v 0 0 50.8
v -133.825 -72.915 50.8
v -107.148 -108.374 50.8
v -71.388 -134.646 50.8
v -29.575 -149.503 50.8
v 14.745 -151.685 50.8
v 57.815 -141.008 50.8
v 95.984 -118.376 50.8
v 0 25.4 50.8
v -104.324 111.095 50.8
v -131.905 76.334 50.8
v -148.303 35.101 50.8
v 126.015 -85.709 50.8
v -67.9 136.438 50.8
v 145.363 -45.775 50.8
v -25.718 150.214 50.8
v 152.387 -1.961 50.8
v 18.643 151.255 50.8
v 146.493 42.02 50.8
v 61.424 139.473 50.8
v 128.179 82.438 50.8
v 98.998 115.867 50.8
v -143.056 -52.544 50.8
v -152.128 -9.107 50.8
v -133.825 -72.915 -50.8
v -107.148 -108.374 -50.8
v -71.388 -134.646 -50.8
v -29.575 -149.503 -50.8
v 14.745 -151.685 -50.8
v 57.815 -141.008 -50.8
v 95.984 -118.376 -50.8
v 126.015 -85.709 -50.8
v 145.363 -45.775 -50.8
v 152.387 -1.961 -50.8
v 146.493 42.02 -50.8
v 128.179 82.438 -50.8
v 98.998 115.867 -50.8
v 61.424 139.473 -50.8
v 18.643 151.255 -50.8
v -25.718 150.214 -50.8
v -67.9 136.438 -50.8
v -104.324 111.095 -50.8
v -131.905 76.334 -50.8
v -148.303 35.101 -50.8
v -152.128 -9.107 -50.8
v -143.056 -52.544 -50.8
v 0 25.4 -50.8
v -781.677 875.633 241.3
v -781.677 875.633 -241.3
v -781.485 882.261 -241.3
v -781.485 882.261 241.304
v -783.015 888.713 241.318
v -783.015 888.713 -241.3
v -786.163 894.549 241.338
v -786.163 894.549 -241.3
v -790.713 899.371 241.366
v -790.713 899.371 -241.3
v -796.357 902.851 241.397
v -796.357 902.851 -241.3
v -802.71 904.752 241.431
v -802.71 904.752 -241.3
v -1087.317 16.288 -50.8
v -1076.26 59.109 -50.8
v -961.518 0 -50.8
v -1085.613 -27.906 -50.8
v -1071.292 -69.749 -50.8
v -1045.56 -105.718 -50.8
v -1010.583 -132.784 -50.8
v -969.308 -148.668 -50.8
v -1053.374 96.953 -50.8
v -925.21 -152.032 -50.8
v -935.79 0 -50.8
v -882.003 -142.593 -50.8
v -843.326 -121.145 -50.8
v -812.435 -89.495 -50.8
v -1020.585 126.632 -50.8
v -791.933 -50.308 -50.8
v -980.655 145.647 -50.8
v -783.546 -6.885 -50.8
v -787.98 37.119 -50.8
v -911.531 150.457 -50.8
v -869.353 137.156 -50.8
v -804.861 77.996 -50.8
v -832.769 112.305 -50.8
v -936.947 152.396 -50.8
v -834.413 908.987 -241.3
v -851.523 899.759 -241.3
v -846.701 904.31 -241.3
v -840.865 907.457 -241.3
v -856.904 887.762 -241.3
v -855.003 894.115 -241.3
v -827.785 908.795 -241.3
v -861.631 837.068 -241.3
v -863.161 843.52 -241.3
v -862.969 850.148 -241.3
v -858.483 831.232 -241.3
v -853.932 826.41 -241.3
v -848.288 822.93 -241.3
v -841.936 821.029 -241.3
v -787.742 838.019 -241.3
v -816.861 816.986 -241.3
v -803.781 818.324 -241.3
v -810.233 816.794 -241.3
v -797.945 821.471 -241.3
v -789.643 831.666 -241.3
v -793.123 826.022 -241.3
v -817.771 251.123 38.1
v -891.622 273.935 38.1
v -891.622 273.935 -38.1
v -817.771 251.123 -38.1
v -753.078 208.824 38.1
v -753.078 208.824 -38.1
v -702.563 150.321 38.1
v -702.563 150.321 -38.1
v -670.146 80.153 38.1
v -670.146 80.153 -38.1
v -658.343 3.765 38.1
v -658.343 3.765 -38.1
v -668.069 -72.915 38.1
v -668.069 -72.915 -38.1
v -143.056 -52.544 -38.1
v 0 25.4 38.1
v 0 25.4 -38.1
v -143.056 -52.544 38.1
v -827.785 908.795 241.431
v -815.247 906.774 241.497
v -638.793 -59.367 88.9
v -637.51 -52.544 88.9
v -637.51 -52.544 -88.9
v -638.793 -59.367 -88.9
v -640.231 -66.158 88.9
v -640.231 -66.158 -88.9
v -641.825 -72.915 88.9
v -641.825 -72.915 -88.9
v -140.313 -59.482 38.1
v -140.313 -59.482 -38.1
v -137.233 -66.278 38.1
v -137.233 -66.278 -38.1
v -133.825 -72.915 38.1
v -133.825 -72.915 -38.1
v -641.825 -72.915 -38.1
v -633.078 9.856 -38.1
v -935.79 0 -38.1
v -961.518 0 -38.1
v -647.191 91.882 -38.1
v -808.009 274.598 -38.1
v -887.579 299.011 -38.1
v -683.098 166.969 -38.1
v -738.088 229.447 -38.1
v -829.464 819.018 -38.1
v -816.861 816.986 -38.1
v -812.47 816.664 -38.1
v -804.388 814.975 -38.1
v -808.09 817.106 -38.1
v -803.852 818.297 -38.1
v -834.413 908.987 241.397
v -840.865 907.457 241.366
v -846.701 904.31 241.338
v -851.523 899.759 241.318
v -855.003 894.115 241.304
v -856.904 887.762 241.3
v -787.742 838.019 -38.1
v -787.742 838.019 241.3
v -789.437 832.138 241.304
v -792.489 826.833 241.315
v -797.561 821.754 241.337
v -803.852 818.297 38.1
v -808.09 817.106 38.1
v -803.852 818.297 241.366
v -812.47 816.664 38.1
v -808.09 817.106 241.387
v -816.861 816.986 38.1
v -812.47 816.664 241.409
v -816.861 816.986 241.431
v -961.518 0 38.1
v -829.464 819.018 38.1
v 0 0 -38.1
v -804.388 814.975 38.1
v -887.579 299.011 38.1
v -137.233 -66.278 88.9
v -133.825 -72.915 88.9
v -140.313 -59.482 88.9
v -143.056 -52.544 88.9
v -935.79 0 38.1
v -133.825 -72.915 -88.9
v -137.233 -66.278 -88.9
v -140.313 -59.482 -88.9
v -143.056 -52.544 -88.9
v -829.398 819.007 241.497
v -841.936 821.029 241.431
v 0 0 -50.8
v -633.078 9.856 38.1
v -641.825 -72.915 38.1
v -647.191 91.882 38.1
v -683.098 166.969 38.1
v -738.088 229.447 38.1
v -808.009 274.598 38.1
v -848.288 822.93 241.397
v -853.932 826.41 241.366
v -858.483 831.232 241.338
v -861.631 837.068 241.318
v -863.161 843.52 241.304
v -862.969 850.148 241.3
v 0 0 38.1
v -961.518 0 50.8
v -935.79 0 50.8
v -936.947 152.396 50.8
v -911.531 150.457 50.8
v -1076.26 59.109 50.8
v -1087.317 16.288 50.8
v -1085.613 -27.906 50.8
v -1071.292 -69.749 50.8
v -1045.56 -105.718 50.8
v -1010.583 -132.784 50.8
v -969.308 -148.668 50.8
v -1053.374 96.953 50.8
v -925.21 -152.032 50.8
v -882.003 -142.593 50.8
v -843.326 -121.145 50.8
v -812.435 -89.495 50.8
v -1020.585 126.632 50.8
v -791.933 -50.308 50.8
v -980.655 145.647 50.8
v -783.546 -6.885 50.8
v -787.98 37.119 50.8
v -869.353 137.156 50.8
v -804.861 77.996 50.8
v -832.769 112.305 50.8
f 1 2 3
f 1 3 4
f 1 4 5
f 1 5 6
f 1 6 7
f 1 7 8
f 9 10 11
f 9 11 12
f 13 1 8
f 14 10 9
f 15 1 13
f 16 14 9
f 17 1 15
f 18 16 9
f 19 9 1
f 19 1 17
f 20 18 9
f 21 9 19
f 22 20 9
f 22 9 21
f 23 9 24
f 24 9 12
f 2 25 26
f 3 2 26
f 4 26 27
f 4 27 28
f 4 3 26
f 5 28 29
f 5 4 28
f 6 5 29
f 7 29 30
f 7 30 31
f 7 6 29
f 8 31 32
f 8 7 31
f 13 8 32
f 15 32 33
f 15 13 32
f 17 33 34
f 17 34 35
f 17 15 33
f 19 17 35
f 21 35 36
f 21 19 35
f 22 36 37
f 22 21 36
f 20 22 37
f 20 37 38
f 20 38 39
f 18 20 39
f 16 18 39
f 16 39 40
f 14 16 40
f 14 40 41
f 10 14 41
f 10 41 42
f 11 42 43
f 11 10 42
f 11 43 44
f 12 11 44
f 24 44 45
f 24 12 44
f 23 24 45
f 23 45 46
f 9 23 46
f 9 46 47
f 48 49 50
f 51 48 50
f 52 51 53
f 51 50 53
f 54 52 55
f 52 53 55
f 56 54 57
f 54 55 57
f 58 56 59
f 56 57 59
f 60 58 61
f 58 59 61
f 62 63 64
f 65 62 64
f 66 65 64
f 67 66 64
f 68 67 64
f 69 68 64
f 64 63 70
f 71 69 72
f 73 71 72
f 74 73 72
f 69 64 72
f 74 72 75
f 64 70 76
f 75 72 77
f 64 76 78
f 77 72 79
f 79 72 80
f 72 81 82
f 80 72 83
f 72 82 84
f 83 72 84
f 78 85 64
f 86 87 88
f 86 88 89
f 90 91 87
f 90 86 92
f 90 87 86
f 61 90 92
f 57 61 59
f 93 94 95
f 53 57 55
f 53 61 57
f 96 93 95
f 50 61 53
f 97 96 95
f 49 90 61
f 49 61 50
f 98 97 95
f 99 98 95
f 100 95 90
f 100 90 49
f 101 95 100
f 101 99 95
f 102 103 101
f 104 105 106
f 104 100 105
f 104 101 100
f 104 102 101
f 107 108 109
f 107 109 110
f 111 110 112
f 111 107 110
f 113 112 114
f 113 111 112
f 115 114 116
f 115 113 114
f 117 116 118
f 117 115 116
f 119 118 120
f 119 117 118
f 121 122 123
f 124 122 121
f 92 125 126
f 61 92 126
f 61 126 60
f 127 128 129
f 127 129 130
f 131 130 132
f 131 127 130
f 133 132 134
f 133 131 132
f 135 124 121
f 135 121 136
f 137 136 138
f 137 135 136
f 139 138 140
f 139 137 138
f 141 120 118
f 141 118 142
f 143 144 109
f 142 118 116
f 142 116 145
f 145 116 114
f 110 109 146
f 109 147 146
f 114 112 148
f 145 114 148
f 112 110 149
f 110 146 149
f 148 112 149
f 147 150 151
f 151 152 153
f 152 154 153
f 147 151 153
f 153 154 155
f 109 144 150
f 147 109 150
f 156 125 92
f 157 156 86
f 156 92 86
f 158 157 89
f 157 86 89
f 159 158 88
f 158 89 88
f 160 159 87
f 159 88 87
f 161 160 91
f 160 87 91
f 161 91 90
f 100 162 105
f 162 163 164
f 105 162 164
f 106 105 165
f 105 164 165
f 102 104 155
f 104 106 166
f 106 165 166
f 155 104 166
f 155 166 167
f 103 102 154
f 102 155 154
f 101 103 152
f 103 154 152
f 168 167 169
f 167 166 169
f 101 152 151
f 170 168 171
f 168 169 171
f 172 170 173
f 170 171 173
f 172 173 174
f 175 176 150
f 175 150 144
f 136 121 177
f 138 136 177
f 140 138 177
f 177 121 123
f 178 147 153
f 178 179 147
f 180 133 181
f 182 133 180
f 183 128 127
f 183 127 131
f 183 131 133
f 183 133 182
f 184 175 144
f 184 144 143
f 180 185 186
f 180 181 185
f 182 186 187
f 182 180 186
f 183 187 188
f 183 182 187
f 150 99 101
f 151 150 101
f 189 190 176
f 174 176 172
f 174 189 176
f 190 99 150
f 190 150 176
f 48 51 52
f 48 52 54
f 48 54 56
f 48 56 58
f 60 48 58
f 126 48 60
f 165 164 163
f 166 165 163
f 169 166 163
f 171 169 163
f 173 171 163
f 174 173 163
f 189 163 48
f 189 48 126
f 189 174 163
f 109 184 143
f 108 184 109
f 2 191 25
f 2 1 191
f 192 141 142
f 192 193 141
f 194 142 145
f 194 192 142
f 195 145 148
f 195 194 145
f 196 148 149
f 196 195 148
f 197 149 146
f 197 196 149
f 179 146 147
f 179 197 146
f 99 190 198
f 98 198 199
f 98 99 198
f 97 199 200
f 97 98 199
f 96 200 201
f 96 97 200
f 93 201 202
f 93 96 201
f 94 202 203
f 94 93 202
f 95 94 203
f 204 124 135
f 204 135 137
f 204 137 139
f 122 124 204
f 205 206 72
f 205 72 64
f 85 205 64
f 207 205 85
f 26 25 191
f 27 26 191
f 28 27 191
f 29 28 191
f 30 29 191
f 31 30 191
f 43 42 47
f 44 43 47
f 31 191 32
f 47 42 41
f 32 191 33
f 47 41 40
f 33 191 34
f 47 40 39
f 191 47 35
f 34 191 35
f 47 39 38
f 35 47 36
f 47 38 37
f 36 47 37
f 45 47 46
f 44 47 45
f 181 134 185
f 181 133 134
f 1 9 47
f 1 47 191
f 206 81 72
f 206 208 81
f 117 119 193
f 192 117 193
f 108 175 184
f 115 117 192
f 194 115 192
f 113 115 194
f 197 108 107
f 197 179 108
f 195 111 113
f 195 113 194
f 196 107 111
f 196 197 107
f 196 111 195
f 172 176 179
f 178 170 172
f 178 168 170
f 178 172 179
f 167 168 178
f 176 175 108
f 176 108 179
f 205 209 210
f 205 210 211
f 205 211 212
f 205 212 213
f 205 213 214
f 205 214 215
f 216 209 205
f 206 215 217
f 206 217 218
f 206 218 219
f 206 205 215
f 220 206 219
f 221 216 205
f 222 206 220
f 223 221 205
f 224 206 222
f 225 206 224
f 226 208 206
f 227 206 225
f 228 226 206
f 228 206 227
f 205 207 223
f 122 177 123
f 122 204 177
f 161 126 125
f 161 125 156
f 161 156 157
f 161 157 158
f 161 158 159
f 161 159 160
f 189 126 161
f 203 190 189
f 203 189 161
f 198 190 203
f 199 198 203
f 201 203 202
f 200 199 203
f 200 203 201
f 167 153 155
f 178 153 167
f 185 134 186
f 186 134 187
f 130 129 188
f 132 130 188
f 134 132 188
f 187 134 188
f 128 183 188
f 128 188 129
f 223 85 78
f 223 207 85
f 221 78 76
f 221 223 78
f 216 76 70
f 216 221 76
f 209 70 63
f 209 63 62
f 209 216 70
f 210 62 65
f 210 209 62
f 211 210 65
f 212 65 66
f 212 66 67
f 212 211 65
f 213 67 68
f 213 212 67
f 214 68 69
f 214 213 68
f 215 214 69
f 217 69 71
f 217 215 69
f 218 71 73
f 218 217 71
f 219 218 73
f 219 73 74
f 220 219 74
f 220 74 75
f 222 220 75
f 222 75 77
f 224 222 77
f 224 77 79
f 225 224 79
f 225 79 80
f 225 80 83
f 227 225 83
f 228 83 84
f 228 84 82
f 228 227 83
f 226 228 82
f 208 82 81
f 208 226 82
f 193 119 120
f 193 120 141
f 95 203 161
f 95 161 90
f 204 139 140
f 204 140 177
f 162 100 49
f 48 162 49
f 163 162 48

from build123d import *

# Parameters (mm, degrees)
F1_DEPTH      = 50.8
F1_DEPTH_BACK = 50.8
F2_DEPTH      = 38.1
F2_DEPTH_BACK = 38.1
F3_DEPTH      = 88.9
F3_DEPTH_BACK = 88.9
F6_DEPTH      = 88.9
F7_T1_DEPTH   = 609.6
F7_T6_DEPTH   = 609.6
F7_T12_DEPTH  = 609.6
F7_T18_DEPTH  = 609.6
F7_T25_DEPTH  = 609.6
F7_T31_DEPTH  = 609.6


# Not quite as in the source:
# - a fillet or chamfer that OpenCascade refuses, or shapes differently, is made with other operations: its cross-section is extruded or revolved along the edge and cut away or added


with BuildPart() as f1:
    # F0 (on Top) → F1 (new body, two sides)
    with BuildSketch(Plane.XY) as f1_sk:
        with BuildLine():
            ThreePointArc((-783.3901008351, 0), (-819.7667936825, 98.8147367419), (-911.5312057875, 150.4568576405))
            Line((-911.5312057875, 150.4568576405), (-935.7901008351, 0))
            Line((-935.7901008351, 0), (-961.5181404919, 0))
            Line((-961.5181404919, 0), (-936.9466506832, 152.3956114606))
            ThreePointArc((-936.9466506832, 152.3956114606), (-1043.1434934298, -108.1712027225), (-783.3901008351, 0))
        make_face()
    extrude(amount=F1_DEPTH)
    extrude(f1_sk.sketch, amount=-F1_DEPTH_BACK)


with BuildPart() as f1b:
    # F0 (on Top) → F1, piece 2 (new body, two sides)
    with BuildSketch(Plane.XY) as f1_2_sk:
        with BuildLine():
            ThreePointArc((-133.8252661358, -72.9147320071), (37.6217320235, -147.6833276966), (152.4, 0))
            ThreePointArc((152.4, 0), (-26.6841566333, 150.0457123172), (-143.0555877267, -52.5438751919))
            Line((-143.0555877267, -52.5438751919), (0, 25.4))
            Line((0, 25.4), (0, 0))
            Line((0, 0), (-133.8252661358, -72.9147320071))
        make_face()
    extrude(amount=F1_DEPTH)
    extrude(f1_2_sk.sketch, amount=-F1_DEPTH_BACK)


with BuildPart() as f2:
    # F0 (on Top) → F2 (new body, two sides)
    with BuildSketch(Plane.XY) as f2_sk:
        with BuildLine():
            Line((-891.6222432269, 273.9348618882), (-887.5790940523, 299.0110048283))
            Line((-887.5790940523, 299.0110048283), (-804.3877526602, 814.9746455529))
            Line((-804.3877526602, 814.9746455529), (-829.4638956003, 819.0177947275))
            Line((-829.4638956003, 819.0177947275), (-936.9466506832, 152.3956114606))
            ThreePointArc((-936.9466506832, 152.3956114606), (-924.1983244388, 151.9585164444), (-911.5312057875, 150.4568576405))
            Line((-911.5312057875, 150.4568576405), (-891.6222432269, 273.9348618882))
        make_face()
        with BuildLine():
            Line((-935.7901008351, 0), (-911.5312057875, 150.4568576405))
            ThreePointArc((-911.5312057875, 150.4568576405), (-924.1983244388, 151.9585164444), (-936.9466506832, 152.3956114606))
            Line((-936.9466506832, 152.3956114606), (-961.5181404919, 0))
            Line((-961.5181404919, 0), (-935.7901008351, 0))
        make_face()
        with BuildLine():
            ThreePointArc((-641.8252661358, -72.9147320071), (-639.4925118211, -62.7663996731), (-637.5099919387, -52.5438751919))
            ThreePointArc((-637.5099919387, -52.5438751919), (-688.9870787149, 175.5566873001), (-887.5790940523, 299.0110048283))
            Line((-887.5790940523, 299.0110048283), (-891.6222432269, 273.9348618882))
            ThreePointArc((-891.6222432269, 273.9348618882), (-702.5631088402, 150.3205854446), (-668.0690705447, -72.9147320071))
            Line((-668.0690705447, -72.9147320071), (-641.8252661358, -72.9147320071))
        make_face()
    extrude(amount=F2_DEPTH)
    extrude(f2_sk.sketch, amount=-F2_DEPTH_BACK)

    # F5 (on line) → F6 (join)
    with BuildSketch(Plane(origin=(107.6913114103, 667.9156770389, 0), x_dir=(0.9872497221, -0.1591791014, 0), z_dir=(-0.1591791014, -0.9872497221, 0))):
        Polygon((-911.0927623749, 0), (-911.0927623749, 241.3), (-949.192252238, 241.4971602735), (-987.291742101, 241.3), (-987.291742101, 0), (-987.291742101, -241.3), (-949.1927623749, -241.3), (-911.0927623749, -241.3), align=None)
    extrude(amount=-F6_DEPTH)

    # F7: fillet of radius 25.4 on 4 edges, made by hand

    # F7_s2 → F7_t1 (cut)
    with BuildSketch(Plane.XY.offset(-304.8)):
        with BuildLine():
            ThreePointArc((-781.6768920702, 875.6329615621), (-786.1625860927, 894.5486832569), (-802.7098858357, 904.7522536768))
            Line((-802.7098858357, 904.7522536768), (-777.6337428956, 900.7091045022))
            Line((-777.6337428956, 900.7091045022), (-781.6768920702, 875.6329615621))
        make_face()
        with BuildLine():
            ThreePointArc((-827.7850215107, 908.7952404451), (-846.7007432055, 904.3095464227), (-856.9043136254, 887.7622466796))
            Line((-856.9043136254, 887.7622466796), (-852.8611644508, 912.8383896197))
            Line((-852.8611644508, 912.8383896197), (-827.7850215107, 908.7952404451))
        make_face()
        with BuildLine():
            ThreePointArc((-841.9360436219, 821.0287401548), (-858.4833433649, 831.2323105747), (-862.9690373873, 850.1480322695))
            Line((-862.9690373873, 850.1480322695), (-867.0121865619, 825.0718893294))
            Line((-867.0121865619, 825.0718893294), (-841.9360436219, 821.0287401548))
        make_face()
    extrude(amount=F7_T1_DEPTH, mode=Mode.SUBTRACT)


with BuildPart() as f2b:
    # F0 (on Top) → F2, piece 2 (new body, two sides)
    with BuildSketch(Plane.XY) as f2_2_sk:
        with BuildLine():
            Line((0, 25.4), (-143.0555877267, -52.5438751919))
            ThreePointArc((-143.0555877267, -52.5438751919), (-138.8146057184, -62.8988492681), (-133.8252661358, -72.9147320071))
            Line((-133.8252661358, -72.9147320071), (0, 0))
            Line((0, 0), (0, 25.4))
        make_face()
    extrude(amount=F2_DEPTH)
    extrude(f2_2_sk.sketch, amount=-F2_DEPTH_BACK)


with BuildPart() as f3:
    # F0 (on Top) → F3 (new body, two sides)
    with BuildSketch(Plane.XY) as f3_sk:
        with BuildLine():
            ThreePointArc((-133.8252661358, -72.9147320071), (-138.8146057184, -62.8988492681), (-143.0555877267, -52.5438751919))
            Line((-143.0555877267, -52.5438751919), (-637.5099919387, -52.5438751919))
            ThreePointArc((-637.5099919387, -52.5438751919), (-639.4925118211, -62.7663996731), (-641.8252661358, -72.9147320071))
            Line((-641.8252661358, -72.9147320071), (-133.8252661358, -72.9147320071))
        make_face()
    extrude(amount=F3_DEPTH)
    extrude(f3_sk.sketch, amount=-F3_DEPTH_BACK)


with BuildPart() as f7_tool4:
    # F7_s5 → F7_t6 (new body)
    with BuildSketch(Plane.XY.offset(304.8)):
        with BuildLine():
            ThreePointArc((-787.7416158321, 838.0187471519), (-797.945186252, 821.4714474089), (-816.8609079468, 816.9857533865))
            Line((-816.8609079468, 816.9857533865), (-791.7847650068, 812.9426042119))
            Line((-791.7847650068, 812.9426042119), (-787.7416158321, 838.0187471519))
        make_face()
    extrude(amount=-F7_T6_DEPTH)

    split(bisect_by=Plane.XY.offset(38.1), keep=Keep.TOP)

    split(bisect_by=Plane(origin=(-912.0790640705, 147.058968514, 0), x_dir=(0, 0, 1), z_dir=(0.9872497221, -0.1591791014, 0)), keep=Keep.TOP)


with BuildPart() as f2_1:
    add(f2.part)

    # F7_t3: cut F7_tool4
    add(f7_tool4.part, mode=Mode.SUBTRACT)


with BuildPart() as f7_tool10:
    # F7_s11 → F7_t12 (new body)
    with BuildSketch(Plane.XY.offset(304.8)):
        with BuildLine():
            ThreePointArc((-787.7416158321, 838.0187471519), (-797.945186252, 821.4714474089), (-816.8609079468, 816.9857533865))
            Line((-816.8609079468, 816.9857533865), (-791.7847650068, 812.9426042119))
            Line((-791.7847650068, 812.9426042119), (-787.7416158321, 838.0187471519))
        make_face()
    extrude(amount=-F7_T12_DEPTH)

    split(bisect_by=Plane.XY.offset(38.1), keep=Keep.TOP)

    split(bisect_by=Plane(origin=(-912.0790640705, 147.058968514, 0), x_dir=(0, 0, 1), z_dir=(-0.9872497221, 0.1591791014, 0)), keep=Keep.TOP)


with BuildPart() as f2_2:
    add(f2_1.part)

    # F7_t9: cut F7_tool10
    add(f7_tool10.part, mode=Mode.SUBTRACT)


with BuildPart() as f7_tool16:
    # F7_s17 → F7_t18 (new body)
    with BuildSketch(Plane.XY.offset(304.8)):
        with BuildLine():
            ThreePointArc((-787.7416158321, 838.0187471519), (-797.945186252, 821.4714474089), (-816.8609079468, 816.9857533865))
            Line((-816.8609079468, 816.9857533865), (-791.7847650068, 812.9426042119))
            Line((-791.7847650068, 812.9426042119), (-787.7416158321, 838.0187471519))
        make_face()
    extrude(amount=-F7_T18_DEPTH)

    split(bisect_by=Plane.XY.offset(38.1), keep=Keep.BOTTOM)

    split(bisect_by=Plane.XY.offset(-38.1), keep=Keep.TOP)

    split(bisect_by=Plane(origin=(-912.0790640705, 147.058968514, 0), x_dir=(0, 0, 1), z_dir=(0.9872497221, -0.1591791014, 0)), keep=Keep.TOP)


with BuildPart() as f2_3:
    add(f2_2.part)

    # F7_t15: cut F7_tool16
    add(f7_tool16.part, mode=Mode.SUBTRACT)


with BuildPart() as f7_tool23:
    # F7_s24 → F7_t25 (new body)
    with BuildSketch(Plane.XY.offset(304.8)):
        with BuildLine():
            ThreePointArc((-787.7416158321, 838.0187471519), (-797.945186252, 821.4714474089), (-816.8609079468, 816.9857533865))
            Line((-816.8609079468, 816.9857533865), (-791.7847650068, 812.9426042119))
            Line((-791.7847650068, 812.9426042119), (-787.7416158321, 838.0187471519))
        make_face()
    extrude(amount=-F7_T25_DEPTH)

    split(bisect_by=Plane.XY.offset(-38.1), keep=Keep.BOTTOM)

    split(bisect_by=Plane(origin=(-912.0790640705, 147.058968514, 0), x_dir=(0, 0, 1), z_dir=(0.9872497221, -0.1591791014, 0)), keep=Keep.TOP)


with BuildPart() as f2_4:
    add(f2_3.part)

    # F7_t22: cut F7_tool23
    add(f7_tool23.part, mode=Mode.SUBTRACT)


with BuildPart() as f7_tool29:
    # F7_s30 → F7_t31 (new body)
    with BuildSketch(Plane.XY.offset(304.8)):
        with BuildLine():
            ThreePointArc((-787.7416158321, 838.0187471519), (-797.945186252, 821.4714474089), (-816.8609079468, 816.9857533865))
            Line((-816.8609079468, 816.9857533865), (-791.7847650068, 812.9426042119))
            Line((-791.7847650068, 812.9426042119), (-787.7416158321, 838.0187471519))
        make_face()
    extrude(amount=-F7_T31_DEPTH)

    split(bisect_by=Plane.XY.offset(-38.1), keep=Keep.BOTTOM)

    split(bisect_by=Plane(origin=(-912.0790640705, 147.058968514, 0), x_dir=(0, 0, 1), z_dir=(-0.9872497221, 0.1591791014, 0)), keep=Keep.TOP)


with BuildPart() as f2_5:
    add(f2_4.part)

    # F7_t28: cut F7_tool29
    add(f7_tool29.part, mode=Mode.SUBTRACT)


solid = Compound([f1.part, f1b.part, f2b.part, f3.part, f2_5.part])
